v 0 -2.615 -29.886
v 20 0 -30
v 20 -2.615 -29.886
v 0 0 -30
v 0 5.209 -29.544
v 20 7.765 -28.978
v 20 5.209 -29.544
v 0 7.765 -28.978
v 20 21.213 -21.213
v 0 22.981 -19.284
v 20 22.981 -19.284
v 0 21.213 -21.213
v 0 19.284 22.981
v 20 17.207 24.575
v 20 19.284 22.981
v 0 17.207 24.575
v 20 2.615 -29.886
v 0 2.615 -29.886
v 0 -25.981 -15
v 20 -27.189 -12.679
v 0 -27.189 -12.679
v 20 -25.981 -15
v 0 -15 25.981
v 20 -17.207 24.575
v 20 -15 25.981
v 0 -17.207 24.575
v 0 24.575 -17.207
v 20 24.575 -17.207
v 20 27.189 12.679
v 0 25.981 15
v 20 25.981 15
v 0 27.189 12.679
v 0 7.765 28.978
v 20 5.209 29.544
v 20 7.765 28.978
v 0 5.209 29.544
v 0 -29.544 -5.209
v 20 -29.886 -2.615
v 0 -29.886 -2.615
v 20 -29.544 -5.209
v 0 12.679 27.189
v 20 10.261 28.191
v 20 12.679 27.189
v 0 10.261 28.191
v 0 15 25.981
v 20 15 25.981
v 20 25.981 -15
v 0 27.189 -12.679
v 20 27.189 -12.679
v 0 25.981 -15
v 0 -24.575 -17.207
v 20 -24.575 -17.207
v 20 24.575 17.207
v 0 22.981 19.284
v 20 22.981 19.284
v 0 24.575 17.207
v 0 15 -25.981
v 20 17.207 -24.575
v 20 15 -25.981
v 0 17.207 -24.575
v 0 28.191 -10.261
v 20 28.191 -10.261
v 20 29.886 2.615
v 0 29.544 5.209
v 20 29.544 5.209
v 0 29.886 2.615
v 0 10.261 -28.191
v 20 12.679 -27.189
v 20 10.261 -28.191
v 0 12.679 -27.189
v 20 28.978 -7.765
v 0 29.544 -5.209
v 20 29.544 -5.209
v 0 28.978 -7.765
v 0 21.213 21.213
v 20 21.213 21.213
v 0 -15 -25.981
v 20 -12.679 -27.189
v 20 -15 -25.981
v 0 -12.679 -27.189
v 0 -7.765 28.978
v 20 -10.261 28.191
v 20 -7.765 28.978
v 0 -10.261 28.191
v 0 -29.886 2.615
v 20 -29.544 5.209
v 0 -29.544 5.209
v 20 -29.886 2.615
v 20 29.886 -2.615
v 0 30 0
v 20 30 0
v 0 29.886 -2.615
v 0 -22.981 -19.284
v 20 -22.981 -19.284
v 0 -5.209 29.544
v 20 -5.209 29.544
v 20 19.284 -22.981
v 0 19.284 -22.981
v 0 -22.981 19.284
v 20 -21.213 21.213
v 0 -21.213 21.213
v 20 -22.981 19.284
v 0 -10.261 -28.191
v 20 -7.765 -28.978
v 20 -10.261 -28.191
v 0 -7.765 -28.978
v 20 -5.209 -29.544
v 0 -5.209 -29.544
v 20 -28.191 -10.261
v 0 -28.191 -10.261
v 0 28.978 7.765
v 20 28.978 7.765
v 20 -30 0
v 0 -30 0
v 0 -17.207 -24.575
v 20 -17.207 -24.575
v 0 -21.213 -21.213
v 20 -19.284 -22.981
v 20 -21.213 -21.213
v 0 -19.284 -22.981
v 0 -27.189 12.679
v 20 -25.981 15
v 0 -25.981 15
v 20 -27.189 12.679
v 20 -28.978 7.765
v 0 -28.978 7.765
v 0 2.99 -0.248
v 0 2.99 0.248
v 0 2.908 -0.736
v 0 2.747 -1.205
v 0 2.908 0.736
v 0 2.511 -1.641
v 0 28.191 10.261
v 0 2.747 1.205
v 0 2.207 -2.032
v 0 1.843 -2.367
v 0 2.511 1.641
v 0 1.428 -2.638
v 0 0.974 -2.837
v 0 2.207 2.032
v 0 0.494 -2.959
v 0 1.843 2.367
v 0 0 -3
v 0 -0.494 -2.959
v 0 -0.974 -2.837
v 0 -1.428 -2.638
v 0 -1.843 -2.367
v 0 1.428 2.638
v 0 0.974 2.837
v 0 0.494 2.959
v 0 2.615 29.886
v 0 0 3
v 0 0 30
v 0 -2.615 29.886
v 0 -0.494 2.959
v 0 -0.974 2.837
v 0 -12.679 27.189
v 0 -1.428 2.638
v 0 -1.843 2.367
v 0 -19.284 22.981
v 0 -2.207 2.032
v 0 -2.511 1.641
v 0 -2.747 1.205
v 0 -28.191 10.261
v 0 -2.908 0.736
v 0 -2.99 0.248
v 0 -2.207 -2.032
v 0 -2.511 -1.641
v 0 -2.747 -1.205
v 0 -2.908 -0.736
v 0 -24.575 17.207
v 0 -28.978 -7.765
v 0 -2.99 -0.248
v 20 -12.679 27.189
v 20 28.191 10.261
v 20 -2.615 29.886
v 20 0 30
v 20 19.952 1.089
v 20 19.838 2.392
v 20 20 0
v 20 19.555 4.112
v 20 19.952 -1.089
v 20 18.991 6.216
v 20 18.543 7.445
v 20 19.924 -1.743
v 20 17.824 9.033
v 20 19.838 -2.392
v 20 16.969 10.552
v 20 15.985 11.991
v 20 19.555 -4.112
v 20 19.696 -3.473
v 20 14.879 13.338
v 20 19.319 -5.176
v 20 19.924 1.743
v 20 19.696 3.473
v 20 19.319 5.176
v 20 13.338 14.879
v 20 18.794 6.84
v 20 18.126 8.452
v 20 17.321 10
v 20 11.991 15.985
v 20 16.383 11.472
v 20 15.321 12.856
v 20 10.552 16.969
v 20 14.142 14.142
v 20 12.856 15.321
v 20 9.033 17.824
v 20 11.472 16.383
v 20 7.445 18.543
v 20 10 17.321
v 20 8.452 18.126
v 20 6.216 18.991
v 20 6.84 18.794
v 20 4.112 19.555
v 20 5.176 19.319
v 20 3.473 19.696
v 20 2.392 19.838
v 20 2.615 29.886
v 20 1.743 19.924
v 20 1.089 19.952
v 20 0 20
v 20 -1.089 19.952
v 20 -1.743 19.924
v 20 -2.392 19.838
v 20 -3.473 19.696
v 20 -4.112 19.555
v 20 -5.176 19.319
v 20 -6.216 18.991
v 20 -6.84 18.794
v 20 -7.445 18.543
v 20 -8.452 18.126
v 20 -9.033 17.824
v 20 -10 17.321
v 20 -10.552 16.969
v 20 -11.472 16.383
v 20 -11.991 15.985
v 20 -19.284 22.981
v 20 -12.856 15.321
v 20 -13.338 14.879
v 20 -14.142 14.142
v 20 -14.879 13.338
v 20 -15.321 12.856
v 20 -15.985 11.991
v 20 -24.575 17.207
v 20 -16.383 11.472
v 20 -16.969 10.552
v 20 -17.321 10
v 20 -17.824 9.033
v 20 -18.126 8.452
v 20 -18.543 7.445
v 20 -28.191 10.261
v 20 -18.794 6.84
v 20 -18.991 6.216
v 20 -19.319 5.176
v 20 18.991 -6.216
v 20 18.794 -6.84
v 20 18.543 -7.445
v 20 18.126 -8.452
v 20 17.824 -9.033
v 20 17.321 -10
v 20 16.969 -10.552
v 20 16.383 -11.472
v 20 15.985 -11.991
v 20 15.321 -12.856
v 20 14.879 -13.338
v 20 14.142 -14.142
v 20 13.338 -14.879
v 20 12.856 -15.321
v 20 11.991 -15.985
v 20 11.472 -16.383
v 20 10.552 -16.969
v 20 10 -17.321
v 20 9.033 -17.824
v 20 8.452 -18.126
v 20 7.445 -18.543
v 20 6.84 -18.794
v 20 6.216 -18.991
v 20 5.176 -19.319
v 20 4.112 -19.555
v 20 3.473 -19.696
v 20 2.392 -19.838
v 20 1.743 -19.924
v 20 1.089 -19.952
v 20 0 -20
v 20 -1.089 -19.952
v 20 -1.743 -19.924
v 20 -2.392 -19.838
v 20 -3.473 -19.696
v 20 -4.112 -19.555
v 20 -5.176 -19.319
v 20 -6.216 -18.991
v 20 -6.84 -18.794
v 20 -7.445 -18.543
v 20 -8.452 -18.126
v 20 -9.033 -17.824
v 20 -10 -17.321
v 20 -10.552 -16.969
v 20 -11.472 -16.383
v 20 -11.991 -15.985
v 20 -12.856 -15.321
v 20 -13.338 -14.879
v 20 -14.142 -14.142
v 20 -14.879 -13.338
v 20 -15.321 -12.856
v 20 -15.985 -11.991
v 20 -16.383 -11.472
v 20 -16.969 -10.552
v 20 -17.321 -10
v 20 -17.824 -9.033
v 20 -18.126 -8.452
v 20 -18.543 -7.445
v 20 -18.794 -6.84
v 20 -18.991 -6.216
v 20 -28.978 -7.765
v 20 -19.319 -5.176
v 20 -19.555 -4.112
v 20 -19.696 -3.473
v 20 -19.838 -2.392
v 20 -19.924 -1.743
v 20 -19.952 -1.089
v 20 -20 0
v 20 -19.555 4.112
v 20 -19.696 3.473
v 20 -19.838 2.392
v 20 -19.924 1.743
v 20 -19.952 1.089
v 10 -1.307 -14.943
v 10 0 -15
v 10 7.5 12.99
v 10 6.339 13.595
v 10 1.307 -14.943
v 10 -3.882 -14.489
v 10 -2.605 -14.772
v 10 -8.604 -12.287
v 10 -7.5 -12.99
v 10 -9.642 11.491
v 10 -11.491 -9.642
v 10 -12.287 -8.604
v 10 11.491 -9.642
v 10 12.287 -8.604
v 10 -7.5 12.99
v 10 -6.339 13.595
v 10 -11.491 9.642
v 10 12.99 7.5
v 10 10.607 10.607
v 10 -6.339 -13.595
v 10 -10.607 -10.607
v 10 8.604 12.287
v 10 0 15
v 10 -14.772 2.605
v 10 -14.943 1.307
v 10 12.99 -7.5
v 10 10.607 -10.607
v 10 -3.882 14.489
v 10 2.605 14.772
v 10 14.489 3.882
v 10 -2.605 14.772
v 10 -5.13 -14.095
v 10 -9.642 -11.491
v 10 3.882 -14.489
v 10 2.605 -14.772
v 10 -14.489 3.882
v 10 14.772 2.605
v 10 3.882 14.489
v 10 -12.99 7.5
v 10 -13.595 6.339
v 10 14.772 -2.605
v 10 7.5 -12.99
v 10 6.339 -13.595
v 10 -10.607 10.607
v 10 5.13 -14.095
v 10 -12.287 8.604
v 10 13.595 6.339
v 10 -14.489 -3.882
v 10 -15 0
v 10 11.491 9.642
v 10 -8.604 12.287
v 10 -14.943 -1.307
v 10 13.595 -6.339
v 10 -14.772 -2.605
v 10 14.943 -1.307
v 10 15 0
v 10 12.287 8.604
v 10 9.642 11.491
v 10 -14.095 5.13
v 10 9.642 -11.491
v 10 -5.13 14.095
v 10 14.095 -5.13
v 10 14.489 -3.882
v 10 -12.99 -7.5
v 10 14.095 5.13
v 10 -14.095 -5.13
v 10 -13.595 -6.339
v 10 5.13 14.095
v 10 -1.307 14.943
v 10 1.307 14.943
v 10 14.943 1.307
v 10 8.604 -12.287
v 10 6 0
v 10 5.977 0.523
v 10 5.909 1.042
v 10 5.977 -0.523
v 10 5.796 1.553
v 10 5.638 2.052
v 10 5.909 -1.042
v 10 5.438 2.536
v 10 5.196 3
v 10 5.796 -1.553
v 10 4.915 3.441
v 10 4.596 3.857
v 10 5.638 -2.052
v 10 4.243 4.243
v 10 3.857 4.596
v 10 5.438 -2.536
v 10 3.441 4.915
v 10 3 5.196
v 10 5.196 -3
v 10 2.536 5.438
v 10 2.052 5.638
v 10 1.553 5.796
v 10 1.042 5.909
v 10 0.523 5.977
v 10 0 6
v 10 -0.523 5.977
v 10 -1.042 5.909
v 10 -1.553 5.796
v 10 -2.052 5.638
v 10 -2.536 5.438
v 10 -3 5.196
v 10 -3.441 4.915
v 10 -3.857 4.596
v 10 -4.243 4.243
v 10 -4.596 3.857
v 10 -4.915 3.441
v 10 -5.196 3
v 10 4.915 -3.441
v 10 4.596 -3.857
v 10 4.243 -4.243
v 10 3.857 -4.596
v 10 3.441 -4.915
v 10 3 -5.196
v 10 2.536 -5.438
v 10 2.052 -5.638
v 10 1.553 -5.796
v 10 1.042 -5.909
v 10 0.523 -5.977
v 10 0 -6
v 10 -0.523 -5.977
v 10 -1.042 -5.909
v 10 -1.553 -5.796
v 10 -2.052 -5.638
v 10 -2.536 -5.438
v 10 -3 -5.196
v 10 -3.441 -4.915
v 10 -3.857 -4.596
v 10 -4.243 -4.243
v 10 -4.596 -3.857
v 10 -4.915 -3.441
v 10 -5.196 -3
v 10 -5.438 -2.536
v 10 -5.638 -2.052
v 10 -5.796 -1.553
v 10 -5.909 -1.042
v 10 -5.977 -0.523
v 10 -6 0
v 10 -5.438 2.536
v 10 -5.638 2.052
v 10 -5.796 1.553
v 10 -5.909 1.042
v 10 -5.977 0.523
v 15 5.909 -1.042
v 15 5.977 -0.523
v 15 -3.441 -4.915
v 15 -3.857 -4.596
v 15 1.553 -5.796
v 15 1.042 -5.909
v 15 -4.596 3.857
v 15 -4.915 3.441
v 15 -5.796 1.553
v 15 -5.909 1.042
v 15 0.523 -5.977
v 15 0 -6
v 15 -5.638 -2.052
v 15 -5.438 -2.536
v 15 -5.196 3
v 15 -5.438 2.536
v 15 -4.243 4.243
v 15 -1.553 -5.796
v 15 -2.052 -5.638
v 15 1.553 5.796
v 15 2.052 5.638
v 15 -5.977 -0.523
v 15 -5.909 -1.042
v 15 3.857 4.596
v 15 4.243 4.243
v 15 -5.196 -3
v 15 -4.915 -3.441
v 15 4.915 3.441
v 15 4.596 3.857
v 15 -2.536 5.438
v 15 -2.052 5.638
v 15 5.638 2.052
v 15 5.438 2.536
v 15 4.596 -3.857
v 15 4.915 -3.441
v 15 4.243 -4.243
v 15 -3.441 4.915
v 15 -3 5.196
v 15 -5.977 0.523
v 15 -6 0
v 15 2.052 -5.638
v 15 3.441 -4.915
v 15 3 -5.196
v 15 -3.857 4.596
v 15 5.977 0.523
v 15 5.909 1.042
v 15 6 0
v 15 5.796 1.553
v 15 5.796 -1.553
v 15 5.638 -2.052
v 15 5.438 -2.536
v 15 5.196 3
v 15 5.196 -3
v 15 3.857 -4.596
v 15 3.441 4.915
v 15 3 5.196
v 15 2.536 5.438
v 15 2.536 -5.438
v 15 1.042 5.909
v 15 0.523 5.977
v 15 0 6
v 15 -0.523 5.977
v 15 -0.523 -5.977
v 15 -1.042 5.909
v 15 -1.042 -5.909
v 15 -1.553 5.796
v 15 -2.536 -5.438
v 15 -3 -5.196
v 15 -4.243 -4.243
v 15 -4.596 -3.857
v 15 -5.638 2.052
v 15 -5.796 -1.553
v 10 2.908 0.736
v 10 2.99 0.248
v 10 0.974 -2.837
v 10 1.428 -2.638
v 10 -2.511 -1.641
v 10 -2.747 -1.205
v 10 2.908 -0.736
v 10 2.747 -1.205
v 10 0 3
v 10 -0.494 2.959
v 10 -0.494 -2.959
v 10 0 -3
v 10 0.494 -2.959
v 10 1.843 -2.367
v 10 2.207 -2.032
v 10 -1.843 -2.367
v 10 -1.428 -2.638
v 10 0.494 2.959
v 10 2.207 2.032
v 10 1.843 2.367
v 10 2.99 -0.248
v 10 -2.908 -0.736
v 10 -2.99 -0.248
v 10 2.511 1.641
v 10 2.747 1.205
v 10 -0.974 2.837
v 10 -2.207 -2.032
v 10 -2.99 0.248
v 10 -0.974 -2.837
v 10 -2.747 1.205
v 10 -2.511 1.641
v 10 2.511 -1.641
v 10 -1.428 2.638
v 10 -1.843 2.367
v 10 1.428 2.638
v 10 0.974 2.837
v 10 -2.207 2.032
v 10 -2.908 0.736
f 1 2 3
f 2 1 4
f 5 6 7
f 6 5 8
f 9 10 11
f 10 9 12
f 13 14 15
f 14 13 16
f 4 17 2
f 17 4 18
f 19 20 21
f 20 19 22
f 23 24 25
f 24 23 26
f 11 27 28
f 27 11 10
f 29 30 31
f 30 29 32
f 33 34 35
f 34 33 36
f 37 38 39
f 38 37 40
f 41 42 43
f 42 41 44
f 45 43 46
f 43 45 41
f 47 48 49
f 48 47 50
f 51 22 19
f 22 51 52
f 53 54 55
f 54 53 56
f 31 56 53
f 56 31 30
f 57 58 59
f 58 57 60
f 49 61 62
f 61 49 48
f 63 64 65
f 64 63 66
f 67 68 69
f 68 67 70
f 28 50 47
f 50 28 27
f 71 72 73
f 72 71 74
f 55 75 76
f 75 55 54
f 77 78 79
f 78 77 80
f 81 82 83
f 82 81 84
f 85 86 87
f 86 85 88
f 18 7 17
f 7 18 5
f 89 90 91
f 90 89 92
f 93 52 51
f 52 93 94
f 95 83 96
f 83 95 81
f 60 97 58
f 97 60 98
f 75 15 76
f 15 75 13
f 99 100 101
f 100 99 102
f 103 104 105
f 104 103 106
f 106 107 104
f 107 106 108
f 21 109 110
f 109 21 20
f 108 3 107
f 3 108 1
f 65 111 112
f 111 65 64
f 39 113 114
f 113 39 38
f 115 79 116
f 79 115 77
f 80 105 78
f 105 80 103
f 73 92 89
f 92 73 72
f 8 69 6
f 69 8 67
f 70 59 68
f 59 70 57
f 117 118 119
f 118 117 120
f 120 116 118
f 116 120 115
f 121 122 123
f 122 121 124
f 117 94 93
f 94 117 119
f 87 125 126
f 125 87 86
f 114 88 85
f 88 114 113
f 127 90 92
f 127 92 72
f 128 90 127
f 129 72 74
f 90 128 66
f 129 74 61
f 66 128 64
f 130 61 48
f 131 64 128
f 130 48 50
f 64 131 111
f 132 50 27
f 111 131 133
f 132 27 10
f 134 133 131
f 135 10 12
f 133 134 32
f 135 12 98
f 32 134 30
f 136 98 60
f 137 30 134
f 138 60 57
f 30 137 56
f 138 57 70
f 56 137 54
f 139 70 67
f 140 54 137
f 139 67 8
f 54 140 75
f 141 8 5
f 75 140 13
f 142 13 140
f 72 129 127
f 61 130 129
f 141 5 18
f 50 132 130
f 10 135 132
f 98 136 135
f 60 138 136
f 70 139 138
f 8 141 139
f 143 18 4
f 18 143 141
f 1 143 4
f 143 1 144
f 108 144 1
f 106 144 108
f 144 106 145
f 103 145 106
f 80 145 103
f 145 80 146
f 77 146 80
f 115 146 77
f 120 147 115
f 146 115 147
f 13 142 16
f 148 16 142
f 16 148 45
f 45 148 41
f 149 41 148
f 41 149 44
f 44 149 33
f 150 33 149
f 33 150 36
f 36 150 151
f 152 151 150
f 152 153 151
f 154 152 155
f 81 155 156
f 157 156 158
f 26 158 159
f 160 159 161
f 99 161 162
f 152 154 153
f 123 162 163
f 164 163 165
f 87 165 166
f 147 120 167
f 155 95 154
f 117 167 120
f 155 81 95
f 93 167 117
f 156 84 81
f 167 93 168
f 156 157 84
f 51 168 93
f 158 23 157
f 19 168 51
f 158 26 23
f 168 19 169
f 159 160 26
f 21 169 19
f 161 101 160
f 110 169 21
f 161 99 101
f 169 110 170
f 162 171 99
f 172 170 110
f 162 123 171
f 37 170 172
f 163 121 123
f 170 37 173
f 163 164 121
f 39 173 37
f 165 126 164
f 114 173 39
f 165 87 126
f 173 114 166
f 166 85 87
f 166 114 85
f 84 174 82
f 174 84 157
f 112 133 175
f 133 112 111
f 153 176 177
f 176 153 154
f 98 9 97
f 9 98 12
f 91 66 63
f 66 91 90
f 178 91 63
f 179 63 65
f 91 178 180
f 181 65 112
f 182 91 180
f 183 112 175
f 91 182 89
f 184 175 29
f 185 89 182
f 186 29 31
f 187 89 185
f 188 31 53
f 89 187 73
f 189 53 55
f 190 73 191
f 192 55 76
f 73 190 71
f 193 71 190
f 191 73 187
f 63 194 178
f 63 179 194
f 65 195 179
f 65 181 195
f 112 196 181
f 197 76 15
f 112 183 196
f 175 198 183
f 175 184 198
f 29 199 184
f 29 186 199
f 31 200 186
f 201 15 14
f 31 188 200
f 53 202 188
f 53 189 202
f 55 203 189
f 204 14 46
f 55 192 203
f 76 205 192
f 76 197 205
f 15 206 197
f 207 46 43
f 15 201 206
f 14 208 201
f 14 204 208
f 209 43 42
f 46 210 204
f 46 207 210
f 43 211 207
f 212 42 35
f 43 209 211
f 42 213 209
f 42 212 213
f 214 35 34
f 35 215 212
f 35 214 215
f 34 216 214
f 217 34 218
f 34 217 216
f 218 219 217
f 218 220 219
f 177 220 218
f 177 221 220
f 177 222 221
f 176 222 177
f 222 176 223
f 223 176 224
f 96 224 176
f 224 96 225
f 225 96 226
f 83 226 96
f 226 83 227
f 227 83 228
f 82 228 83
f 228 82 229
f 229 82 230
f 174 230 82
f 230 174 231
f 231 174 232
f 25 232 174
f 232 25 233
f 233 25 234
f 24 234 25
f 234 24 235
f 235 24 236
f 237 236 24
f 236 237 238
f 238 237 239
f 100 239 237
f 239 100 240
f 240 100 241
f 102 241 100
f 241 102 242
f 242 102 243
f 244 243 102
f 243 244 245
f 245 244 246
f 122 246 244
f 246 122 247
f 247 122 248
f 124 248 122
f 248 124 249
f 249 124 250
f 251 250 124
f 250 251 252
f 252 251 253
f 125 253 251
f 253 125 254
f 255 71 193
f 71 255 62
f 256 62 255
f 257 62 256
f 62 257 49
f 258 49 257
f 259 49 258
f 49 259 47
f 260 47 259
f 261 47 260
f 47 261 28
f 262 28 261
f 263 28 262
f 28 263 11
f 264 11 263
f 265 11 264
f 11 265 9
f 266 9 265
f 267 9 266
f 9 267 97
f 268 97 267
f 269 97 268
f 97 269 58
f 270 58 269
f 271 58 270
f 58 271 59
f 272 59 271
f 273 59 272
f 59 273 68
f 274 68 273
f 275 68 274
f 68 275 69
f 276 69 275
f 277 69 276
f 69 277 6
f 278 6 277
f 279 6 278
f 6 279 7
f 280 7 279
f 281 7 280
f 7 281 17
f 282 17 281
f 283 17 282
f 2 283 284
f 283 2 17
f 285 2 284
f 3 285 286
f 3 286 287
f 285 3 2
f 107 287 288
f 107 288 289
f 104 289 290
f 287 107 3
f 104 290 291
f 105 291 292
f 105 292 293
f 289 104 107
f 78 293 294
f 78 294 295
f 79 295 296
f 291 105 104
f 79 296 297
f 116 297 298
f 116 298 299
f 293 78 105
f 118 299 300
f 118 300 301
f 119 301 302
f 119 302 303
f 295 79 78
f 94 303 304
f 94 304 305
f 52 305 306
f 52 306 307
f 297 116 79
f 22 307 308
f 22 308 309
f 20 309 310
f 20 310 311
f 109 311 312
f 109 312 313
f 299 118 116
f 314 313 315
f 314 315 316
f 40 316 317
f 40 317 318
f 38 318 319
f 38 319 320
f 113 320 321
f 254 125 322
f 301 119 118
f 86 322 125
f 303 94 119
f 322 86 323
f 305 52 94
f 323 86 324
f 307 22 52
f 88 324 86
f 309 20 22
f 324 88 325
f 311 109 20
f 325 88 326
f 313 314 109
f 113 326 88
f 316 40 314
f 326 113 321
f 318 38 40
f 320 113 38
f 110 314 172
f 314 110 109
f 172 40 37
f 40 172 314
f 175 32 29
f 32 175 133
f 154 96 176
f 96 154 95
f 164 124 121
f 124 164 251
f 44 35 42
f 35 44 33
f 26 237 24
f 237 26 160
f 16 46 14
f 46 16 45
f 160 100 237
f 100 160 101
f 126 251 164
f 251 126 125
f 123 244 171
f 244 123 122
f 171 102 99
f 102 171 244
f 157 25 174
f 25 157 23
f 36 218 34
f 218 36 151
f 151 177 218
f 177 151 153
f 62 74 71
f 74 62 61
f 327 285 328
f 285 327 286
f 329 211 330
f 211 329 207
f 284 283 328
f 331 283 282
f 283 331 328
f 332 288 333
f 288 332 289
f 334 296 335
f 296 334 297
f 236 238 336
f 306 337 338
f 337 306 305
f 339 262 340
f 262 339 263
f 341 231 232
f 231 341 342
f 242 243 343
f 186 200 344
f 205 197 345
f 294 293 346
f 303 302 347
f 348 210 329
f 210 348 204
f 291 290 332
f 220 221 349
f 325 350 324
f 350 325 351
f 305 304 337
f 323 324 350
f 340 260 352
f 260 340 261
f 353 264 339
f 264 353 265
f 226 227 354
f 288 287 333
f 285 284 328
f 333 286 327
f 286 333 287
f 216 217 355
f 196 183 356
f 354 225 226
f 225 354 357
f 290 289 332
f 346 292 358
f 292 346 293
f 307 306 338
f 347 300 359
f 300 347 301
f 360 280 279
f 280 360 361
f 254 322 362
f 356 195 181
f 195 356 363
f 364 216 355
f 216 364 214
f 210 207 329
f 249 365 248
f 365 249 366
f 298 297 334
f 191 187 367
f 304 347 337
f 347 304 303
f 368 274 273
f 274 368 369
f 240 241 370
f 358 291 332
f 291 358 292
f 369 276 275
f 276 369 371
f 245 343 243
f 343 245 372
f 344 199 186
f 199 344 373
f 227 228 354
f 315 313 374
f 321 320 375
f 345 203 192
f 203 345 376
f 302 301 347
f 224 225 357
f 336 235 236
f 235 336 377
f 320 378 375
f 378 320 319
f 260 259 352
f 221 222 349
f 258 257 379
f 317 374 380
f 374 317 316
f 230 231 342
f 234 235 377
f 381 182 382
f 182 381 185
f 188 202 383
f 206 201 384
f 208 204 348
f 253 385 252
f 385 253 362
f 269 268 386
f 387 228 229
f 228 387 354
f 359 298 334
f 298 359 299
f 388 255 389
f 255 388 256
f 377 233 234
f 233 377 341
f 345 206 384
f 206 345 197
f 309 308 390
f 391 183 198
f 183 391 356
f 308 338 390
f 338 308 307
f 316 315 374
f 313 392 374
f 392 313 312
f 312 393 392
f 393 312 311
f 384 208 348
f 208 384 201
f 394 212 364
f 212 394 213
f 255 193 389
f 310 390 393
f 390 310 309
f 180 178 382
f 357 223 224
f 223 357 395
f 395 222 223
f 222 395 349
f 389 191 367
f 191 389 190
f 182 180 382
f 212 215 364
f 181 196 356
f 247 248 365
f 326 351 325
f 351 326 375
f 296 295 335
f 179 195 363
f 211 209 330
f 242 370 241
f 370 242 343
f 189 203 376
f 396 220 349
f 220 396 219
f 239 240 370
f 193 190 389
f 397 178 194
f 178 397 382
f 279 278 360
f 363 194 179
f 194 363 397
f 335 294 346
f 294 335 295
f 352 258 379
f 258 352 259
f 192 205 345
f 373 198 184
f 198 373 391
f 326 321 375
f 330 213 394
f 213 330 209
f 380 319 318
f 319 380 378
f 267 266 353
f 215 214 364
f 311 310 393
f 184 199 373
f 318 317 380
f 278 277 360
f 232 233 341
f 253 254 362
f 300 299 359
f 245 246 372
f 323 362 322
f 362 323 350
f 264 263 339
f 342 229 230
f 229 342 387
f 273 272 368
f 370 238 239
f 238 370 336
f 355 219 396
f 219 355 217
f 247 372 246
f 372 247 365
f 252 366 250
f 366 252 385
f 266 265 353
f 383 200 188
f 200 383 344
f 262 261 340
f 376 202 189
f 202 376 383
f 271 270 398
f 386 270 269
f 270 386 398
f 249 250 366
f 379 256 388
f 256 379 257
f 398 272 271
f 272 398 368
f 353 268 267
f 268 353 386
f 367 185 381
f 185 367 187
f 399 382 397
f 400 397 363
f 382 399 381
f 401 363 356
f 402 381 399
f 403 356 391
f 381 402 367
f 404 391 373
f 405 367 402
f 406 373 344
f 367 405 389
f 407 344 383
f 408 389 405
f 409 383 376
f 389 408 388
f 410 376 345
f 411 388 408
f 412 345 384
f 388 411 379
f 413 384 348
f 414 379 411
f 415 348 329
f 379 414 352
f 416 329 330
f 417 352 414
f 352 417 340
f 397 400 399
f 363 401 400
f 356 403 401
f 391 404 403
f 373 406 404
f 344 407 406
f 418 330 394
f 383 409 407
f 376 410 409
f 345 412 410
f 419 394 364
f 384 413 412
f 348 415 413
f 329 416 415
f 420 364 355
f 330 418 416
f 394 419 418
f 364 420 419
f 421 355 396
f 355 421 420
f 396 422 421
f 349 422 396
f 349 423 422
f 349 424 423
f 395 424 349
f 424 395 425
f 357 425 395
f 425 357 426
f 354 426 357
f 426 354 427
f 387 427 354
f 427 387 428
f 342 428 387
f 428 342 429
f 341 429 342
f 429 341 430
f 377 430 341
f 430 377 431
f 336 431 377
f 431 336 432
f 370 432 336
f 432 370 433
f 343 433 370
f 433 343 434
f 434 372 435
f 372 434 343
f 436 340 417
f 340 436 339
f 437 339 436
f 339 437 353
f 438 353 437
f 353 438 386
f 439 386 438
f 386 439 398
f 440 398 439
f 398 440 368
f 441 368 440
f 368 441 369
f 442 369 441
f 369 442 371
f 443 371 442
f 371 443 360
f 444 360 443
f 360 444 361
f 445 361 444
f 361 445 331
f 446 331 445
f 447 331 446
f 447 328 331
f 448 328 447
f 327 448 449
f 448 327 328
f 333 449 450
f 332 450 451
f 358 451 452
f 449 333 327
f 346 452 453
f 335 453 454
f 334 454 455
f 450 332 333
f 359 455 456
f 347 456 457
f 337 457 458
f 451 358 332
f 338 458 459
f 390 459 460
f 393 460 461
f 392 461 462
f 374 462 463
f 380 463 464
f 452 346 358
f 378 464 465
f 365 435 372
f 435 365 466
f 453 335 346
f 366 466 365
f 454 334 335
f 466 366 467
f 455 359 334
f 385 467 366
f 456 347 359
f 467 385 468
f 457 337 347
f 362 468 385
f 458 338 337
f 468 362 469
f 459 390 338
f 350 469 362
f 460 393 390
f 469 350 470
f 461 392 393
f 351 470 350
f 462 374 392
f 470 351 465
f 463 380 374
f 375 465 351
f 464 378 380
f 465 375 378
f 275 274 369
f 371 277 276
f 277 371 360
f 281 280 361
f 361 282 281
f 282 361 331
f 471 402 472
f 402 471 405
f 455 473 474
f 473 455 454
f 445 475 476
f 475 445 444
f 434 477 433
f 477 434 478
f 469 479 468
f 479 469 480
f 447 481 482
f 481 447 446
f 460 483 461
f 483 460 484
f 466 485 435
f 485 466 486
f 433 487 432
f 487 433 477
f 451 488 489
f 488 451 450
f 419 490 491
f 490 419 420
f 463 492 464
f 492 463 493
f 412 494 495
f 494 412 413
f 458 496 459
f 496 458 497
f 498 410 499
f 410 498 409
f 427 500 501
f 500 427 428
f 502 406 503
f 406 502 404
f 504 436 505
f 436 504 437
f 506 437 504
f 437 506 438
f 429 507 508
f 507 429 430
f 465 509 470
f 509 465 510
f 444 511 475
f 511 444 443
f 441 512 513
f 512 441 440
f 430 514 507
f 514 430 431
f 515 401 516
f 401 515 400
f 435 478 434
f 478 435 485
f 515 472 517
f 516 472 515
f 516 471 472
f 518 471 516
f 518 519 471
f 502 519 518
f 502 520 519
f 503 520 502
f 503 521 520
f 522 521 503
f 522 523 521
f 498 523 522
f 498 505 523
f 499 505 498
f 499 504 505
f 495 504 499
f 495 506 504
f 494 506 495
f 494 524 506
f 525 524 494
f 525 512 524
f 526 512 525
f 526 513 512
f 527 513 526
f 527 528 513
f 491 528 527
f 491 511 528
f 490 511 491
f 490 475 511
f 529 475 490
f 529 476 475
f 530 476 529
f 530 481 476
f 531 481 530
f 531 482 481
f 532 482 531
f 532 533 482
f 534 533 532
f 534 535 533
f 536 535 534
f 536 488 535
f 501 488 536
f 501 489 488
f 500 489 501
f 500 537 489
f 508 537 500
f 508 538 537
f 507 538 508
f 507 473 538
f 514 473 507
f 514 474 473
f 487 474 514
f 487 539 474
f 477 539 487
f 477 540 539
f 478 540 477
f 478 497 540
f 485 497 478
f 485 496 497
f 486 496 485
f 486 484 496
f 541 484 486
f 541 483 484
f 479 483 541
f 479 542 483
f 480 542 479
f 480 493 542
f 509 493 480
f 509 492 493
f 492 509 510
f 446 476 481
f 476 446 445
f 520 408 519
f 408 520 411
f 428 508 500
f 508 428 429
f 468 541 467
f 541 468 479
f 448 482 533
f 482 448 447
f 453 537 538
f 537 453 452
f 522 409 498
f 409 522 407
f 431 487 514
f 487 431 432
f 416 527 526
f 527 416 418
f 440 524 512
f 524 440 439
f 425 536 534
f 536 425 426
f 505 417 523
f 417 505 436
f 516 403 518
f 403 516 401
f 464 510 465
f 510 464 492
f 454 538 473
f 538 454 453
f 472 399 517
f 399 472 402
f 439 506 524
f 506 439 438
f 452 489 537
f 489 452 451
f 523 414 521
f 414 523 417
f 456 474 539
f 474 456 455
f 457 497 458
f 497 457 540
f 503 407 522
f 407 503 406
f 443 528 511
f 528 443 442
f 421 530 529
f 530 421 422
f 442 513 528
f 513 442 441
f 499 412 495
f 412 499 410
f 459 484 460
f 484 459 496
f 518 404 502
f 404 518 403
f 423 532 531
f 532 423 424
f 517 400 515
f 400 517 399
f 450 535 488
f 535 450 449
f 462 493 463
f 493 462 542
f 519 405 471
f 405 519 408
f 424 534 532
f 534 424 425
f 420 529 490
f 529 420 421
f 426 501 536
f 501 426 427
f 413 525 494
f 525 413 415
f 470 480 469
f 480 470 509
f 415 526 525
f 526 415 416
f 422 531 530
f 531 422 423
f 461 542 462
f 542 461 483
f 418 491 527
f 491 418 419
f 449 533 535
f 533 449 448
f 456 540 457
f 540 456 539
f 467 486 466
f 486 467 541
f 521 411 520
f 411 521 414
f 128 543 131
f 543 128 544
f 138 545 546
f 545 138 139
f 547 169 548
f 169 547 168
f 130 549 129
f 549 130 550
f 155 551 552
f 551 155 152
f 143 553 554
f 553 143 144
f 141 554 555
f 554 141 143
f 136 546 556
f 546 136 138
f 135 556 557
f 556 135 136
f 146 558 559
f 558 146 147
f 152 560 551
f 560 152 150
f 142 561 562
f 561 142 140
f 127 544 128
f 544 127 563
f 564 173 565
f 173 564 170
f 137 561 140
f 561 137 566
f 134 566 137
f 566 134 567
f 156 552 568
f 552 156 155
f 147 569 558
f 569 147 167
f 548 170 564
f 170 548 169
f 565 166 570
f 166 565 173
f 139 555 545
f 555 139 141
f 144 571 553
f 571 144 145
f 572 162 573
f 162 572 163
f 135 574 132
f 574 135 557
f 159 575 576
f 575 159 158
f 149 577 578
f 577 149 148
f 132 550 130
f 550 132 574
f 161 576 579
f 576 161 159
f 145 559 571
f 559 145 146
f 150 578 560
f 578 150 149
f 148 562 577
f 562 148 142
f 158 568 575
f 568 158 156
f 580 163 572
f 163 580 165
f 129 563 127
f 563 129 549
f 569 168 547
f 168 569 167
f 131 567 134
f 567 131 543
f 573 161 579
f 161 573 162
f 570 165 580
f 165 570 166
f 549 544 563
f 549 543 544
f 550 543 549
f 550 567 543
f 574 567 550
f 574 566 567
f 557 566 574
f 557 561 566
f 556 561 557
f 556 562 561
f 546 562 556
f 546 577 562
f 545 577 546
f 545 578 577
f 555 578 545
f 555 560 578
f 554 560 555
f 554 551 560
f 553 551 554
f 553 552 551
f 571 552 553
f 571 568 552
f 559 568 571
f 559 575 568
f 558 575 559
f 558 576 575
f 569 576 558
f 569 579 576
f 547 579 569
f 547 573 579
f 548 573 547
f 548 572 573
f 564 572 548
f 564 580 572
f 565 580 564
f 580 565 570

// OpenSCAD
// this file defines the front wheel


// global definitions
$fa = 5;
$fs = 0.5;


// shows front wheel
frontWheel();


// front wheel
module frontWheel()
{
  difference()
  {
    union()
    {
      difference()
      {
        // basic wheel
        rotate([0,90,0]) cylinder(d = 60,h = 20);

        // shape rim
        translate([10,0,0]) rotate([0,90,0]) cylinder(d1 = 30, d2 = 50, h = 20);
      }
      
      // support to hold shaft
      rotate([0,90,0]) cylinder(d = 12,h = 15);
    }
  
    // hole for shaft
    rotate([0,90,0]) cylinder(d = 6,h = 20, center = true);
  }
}
